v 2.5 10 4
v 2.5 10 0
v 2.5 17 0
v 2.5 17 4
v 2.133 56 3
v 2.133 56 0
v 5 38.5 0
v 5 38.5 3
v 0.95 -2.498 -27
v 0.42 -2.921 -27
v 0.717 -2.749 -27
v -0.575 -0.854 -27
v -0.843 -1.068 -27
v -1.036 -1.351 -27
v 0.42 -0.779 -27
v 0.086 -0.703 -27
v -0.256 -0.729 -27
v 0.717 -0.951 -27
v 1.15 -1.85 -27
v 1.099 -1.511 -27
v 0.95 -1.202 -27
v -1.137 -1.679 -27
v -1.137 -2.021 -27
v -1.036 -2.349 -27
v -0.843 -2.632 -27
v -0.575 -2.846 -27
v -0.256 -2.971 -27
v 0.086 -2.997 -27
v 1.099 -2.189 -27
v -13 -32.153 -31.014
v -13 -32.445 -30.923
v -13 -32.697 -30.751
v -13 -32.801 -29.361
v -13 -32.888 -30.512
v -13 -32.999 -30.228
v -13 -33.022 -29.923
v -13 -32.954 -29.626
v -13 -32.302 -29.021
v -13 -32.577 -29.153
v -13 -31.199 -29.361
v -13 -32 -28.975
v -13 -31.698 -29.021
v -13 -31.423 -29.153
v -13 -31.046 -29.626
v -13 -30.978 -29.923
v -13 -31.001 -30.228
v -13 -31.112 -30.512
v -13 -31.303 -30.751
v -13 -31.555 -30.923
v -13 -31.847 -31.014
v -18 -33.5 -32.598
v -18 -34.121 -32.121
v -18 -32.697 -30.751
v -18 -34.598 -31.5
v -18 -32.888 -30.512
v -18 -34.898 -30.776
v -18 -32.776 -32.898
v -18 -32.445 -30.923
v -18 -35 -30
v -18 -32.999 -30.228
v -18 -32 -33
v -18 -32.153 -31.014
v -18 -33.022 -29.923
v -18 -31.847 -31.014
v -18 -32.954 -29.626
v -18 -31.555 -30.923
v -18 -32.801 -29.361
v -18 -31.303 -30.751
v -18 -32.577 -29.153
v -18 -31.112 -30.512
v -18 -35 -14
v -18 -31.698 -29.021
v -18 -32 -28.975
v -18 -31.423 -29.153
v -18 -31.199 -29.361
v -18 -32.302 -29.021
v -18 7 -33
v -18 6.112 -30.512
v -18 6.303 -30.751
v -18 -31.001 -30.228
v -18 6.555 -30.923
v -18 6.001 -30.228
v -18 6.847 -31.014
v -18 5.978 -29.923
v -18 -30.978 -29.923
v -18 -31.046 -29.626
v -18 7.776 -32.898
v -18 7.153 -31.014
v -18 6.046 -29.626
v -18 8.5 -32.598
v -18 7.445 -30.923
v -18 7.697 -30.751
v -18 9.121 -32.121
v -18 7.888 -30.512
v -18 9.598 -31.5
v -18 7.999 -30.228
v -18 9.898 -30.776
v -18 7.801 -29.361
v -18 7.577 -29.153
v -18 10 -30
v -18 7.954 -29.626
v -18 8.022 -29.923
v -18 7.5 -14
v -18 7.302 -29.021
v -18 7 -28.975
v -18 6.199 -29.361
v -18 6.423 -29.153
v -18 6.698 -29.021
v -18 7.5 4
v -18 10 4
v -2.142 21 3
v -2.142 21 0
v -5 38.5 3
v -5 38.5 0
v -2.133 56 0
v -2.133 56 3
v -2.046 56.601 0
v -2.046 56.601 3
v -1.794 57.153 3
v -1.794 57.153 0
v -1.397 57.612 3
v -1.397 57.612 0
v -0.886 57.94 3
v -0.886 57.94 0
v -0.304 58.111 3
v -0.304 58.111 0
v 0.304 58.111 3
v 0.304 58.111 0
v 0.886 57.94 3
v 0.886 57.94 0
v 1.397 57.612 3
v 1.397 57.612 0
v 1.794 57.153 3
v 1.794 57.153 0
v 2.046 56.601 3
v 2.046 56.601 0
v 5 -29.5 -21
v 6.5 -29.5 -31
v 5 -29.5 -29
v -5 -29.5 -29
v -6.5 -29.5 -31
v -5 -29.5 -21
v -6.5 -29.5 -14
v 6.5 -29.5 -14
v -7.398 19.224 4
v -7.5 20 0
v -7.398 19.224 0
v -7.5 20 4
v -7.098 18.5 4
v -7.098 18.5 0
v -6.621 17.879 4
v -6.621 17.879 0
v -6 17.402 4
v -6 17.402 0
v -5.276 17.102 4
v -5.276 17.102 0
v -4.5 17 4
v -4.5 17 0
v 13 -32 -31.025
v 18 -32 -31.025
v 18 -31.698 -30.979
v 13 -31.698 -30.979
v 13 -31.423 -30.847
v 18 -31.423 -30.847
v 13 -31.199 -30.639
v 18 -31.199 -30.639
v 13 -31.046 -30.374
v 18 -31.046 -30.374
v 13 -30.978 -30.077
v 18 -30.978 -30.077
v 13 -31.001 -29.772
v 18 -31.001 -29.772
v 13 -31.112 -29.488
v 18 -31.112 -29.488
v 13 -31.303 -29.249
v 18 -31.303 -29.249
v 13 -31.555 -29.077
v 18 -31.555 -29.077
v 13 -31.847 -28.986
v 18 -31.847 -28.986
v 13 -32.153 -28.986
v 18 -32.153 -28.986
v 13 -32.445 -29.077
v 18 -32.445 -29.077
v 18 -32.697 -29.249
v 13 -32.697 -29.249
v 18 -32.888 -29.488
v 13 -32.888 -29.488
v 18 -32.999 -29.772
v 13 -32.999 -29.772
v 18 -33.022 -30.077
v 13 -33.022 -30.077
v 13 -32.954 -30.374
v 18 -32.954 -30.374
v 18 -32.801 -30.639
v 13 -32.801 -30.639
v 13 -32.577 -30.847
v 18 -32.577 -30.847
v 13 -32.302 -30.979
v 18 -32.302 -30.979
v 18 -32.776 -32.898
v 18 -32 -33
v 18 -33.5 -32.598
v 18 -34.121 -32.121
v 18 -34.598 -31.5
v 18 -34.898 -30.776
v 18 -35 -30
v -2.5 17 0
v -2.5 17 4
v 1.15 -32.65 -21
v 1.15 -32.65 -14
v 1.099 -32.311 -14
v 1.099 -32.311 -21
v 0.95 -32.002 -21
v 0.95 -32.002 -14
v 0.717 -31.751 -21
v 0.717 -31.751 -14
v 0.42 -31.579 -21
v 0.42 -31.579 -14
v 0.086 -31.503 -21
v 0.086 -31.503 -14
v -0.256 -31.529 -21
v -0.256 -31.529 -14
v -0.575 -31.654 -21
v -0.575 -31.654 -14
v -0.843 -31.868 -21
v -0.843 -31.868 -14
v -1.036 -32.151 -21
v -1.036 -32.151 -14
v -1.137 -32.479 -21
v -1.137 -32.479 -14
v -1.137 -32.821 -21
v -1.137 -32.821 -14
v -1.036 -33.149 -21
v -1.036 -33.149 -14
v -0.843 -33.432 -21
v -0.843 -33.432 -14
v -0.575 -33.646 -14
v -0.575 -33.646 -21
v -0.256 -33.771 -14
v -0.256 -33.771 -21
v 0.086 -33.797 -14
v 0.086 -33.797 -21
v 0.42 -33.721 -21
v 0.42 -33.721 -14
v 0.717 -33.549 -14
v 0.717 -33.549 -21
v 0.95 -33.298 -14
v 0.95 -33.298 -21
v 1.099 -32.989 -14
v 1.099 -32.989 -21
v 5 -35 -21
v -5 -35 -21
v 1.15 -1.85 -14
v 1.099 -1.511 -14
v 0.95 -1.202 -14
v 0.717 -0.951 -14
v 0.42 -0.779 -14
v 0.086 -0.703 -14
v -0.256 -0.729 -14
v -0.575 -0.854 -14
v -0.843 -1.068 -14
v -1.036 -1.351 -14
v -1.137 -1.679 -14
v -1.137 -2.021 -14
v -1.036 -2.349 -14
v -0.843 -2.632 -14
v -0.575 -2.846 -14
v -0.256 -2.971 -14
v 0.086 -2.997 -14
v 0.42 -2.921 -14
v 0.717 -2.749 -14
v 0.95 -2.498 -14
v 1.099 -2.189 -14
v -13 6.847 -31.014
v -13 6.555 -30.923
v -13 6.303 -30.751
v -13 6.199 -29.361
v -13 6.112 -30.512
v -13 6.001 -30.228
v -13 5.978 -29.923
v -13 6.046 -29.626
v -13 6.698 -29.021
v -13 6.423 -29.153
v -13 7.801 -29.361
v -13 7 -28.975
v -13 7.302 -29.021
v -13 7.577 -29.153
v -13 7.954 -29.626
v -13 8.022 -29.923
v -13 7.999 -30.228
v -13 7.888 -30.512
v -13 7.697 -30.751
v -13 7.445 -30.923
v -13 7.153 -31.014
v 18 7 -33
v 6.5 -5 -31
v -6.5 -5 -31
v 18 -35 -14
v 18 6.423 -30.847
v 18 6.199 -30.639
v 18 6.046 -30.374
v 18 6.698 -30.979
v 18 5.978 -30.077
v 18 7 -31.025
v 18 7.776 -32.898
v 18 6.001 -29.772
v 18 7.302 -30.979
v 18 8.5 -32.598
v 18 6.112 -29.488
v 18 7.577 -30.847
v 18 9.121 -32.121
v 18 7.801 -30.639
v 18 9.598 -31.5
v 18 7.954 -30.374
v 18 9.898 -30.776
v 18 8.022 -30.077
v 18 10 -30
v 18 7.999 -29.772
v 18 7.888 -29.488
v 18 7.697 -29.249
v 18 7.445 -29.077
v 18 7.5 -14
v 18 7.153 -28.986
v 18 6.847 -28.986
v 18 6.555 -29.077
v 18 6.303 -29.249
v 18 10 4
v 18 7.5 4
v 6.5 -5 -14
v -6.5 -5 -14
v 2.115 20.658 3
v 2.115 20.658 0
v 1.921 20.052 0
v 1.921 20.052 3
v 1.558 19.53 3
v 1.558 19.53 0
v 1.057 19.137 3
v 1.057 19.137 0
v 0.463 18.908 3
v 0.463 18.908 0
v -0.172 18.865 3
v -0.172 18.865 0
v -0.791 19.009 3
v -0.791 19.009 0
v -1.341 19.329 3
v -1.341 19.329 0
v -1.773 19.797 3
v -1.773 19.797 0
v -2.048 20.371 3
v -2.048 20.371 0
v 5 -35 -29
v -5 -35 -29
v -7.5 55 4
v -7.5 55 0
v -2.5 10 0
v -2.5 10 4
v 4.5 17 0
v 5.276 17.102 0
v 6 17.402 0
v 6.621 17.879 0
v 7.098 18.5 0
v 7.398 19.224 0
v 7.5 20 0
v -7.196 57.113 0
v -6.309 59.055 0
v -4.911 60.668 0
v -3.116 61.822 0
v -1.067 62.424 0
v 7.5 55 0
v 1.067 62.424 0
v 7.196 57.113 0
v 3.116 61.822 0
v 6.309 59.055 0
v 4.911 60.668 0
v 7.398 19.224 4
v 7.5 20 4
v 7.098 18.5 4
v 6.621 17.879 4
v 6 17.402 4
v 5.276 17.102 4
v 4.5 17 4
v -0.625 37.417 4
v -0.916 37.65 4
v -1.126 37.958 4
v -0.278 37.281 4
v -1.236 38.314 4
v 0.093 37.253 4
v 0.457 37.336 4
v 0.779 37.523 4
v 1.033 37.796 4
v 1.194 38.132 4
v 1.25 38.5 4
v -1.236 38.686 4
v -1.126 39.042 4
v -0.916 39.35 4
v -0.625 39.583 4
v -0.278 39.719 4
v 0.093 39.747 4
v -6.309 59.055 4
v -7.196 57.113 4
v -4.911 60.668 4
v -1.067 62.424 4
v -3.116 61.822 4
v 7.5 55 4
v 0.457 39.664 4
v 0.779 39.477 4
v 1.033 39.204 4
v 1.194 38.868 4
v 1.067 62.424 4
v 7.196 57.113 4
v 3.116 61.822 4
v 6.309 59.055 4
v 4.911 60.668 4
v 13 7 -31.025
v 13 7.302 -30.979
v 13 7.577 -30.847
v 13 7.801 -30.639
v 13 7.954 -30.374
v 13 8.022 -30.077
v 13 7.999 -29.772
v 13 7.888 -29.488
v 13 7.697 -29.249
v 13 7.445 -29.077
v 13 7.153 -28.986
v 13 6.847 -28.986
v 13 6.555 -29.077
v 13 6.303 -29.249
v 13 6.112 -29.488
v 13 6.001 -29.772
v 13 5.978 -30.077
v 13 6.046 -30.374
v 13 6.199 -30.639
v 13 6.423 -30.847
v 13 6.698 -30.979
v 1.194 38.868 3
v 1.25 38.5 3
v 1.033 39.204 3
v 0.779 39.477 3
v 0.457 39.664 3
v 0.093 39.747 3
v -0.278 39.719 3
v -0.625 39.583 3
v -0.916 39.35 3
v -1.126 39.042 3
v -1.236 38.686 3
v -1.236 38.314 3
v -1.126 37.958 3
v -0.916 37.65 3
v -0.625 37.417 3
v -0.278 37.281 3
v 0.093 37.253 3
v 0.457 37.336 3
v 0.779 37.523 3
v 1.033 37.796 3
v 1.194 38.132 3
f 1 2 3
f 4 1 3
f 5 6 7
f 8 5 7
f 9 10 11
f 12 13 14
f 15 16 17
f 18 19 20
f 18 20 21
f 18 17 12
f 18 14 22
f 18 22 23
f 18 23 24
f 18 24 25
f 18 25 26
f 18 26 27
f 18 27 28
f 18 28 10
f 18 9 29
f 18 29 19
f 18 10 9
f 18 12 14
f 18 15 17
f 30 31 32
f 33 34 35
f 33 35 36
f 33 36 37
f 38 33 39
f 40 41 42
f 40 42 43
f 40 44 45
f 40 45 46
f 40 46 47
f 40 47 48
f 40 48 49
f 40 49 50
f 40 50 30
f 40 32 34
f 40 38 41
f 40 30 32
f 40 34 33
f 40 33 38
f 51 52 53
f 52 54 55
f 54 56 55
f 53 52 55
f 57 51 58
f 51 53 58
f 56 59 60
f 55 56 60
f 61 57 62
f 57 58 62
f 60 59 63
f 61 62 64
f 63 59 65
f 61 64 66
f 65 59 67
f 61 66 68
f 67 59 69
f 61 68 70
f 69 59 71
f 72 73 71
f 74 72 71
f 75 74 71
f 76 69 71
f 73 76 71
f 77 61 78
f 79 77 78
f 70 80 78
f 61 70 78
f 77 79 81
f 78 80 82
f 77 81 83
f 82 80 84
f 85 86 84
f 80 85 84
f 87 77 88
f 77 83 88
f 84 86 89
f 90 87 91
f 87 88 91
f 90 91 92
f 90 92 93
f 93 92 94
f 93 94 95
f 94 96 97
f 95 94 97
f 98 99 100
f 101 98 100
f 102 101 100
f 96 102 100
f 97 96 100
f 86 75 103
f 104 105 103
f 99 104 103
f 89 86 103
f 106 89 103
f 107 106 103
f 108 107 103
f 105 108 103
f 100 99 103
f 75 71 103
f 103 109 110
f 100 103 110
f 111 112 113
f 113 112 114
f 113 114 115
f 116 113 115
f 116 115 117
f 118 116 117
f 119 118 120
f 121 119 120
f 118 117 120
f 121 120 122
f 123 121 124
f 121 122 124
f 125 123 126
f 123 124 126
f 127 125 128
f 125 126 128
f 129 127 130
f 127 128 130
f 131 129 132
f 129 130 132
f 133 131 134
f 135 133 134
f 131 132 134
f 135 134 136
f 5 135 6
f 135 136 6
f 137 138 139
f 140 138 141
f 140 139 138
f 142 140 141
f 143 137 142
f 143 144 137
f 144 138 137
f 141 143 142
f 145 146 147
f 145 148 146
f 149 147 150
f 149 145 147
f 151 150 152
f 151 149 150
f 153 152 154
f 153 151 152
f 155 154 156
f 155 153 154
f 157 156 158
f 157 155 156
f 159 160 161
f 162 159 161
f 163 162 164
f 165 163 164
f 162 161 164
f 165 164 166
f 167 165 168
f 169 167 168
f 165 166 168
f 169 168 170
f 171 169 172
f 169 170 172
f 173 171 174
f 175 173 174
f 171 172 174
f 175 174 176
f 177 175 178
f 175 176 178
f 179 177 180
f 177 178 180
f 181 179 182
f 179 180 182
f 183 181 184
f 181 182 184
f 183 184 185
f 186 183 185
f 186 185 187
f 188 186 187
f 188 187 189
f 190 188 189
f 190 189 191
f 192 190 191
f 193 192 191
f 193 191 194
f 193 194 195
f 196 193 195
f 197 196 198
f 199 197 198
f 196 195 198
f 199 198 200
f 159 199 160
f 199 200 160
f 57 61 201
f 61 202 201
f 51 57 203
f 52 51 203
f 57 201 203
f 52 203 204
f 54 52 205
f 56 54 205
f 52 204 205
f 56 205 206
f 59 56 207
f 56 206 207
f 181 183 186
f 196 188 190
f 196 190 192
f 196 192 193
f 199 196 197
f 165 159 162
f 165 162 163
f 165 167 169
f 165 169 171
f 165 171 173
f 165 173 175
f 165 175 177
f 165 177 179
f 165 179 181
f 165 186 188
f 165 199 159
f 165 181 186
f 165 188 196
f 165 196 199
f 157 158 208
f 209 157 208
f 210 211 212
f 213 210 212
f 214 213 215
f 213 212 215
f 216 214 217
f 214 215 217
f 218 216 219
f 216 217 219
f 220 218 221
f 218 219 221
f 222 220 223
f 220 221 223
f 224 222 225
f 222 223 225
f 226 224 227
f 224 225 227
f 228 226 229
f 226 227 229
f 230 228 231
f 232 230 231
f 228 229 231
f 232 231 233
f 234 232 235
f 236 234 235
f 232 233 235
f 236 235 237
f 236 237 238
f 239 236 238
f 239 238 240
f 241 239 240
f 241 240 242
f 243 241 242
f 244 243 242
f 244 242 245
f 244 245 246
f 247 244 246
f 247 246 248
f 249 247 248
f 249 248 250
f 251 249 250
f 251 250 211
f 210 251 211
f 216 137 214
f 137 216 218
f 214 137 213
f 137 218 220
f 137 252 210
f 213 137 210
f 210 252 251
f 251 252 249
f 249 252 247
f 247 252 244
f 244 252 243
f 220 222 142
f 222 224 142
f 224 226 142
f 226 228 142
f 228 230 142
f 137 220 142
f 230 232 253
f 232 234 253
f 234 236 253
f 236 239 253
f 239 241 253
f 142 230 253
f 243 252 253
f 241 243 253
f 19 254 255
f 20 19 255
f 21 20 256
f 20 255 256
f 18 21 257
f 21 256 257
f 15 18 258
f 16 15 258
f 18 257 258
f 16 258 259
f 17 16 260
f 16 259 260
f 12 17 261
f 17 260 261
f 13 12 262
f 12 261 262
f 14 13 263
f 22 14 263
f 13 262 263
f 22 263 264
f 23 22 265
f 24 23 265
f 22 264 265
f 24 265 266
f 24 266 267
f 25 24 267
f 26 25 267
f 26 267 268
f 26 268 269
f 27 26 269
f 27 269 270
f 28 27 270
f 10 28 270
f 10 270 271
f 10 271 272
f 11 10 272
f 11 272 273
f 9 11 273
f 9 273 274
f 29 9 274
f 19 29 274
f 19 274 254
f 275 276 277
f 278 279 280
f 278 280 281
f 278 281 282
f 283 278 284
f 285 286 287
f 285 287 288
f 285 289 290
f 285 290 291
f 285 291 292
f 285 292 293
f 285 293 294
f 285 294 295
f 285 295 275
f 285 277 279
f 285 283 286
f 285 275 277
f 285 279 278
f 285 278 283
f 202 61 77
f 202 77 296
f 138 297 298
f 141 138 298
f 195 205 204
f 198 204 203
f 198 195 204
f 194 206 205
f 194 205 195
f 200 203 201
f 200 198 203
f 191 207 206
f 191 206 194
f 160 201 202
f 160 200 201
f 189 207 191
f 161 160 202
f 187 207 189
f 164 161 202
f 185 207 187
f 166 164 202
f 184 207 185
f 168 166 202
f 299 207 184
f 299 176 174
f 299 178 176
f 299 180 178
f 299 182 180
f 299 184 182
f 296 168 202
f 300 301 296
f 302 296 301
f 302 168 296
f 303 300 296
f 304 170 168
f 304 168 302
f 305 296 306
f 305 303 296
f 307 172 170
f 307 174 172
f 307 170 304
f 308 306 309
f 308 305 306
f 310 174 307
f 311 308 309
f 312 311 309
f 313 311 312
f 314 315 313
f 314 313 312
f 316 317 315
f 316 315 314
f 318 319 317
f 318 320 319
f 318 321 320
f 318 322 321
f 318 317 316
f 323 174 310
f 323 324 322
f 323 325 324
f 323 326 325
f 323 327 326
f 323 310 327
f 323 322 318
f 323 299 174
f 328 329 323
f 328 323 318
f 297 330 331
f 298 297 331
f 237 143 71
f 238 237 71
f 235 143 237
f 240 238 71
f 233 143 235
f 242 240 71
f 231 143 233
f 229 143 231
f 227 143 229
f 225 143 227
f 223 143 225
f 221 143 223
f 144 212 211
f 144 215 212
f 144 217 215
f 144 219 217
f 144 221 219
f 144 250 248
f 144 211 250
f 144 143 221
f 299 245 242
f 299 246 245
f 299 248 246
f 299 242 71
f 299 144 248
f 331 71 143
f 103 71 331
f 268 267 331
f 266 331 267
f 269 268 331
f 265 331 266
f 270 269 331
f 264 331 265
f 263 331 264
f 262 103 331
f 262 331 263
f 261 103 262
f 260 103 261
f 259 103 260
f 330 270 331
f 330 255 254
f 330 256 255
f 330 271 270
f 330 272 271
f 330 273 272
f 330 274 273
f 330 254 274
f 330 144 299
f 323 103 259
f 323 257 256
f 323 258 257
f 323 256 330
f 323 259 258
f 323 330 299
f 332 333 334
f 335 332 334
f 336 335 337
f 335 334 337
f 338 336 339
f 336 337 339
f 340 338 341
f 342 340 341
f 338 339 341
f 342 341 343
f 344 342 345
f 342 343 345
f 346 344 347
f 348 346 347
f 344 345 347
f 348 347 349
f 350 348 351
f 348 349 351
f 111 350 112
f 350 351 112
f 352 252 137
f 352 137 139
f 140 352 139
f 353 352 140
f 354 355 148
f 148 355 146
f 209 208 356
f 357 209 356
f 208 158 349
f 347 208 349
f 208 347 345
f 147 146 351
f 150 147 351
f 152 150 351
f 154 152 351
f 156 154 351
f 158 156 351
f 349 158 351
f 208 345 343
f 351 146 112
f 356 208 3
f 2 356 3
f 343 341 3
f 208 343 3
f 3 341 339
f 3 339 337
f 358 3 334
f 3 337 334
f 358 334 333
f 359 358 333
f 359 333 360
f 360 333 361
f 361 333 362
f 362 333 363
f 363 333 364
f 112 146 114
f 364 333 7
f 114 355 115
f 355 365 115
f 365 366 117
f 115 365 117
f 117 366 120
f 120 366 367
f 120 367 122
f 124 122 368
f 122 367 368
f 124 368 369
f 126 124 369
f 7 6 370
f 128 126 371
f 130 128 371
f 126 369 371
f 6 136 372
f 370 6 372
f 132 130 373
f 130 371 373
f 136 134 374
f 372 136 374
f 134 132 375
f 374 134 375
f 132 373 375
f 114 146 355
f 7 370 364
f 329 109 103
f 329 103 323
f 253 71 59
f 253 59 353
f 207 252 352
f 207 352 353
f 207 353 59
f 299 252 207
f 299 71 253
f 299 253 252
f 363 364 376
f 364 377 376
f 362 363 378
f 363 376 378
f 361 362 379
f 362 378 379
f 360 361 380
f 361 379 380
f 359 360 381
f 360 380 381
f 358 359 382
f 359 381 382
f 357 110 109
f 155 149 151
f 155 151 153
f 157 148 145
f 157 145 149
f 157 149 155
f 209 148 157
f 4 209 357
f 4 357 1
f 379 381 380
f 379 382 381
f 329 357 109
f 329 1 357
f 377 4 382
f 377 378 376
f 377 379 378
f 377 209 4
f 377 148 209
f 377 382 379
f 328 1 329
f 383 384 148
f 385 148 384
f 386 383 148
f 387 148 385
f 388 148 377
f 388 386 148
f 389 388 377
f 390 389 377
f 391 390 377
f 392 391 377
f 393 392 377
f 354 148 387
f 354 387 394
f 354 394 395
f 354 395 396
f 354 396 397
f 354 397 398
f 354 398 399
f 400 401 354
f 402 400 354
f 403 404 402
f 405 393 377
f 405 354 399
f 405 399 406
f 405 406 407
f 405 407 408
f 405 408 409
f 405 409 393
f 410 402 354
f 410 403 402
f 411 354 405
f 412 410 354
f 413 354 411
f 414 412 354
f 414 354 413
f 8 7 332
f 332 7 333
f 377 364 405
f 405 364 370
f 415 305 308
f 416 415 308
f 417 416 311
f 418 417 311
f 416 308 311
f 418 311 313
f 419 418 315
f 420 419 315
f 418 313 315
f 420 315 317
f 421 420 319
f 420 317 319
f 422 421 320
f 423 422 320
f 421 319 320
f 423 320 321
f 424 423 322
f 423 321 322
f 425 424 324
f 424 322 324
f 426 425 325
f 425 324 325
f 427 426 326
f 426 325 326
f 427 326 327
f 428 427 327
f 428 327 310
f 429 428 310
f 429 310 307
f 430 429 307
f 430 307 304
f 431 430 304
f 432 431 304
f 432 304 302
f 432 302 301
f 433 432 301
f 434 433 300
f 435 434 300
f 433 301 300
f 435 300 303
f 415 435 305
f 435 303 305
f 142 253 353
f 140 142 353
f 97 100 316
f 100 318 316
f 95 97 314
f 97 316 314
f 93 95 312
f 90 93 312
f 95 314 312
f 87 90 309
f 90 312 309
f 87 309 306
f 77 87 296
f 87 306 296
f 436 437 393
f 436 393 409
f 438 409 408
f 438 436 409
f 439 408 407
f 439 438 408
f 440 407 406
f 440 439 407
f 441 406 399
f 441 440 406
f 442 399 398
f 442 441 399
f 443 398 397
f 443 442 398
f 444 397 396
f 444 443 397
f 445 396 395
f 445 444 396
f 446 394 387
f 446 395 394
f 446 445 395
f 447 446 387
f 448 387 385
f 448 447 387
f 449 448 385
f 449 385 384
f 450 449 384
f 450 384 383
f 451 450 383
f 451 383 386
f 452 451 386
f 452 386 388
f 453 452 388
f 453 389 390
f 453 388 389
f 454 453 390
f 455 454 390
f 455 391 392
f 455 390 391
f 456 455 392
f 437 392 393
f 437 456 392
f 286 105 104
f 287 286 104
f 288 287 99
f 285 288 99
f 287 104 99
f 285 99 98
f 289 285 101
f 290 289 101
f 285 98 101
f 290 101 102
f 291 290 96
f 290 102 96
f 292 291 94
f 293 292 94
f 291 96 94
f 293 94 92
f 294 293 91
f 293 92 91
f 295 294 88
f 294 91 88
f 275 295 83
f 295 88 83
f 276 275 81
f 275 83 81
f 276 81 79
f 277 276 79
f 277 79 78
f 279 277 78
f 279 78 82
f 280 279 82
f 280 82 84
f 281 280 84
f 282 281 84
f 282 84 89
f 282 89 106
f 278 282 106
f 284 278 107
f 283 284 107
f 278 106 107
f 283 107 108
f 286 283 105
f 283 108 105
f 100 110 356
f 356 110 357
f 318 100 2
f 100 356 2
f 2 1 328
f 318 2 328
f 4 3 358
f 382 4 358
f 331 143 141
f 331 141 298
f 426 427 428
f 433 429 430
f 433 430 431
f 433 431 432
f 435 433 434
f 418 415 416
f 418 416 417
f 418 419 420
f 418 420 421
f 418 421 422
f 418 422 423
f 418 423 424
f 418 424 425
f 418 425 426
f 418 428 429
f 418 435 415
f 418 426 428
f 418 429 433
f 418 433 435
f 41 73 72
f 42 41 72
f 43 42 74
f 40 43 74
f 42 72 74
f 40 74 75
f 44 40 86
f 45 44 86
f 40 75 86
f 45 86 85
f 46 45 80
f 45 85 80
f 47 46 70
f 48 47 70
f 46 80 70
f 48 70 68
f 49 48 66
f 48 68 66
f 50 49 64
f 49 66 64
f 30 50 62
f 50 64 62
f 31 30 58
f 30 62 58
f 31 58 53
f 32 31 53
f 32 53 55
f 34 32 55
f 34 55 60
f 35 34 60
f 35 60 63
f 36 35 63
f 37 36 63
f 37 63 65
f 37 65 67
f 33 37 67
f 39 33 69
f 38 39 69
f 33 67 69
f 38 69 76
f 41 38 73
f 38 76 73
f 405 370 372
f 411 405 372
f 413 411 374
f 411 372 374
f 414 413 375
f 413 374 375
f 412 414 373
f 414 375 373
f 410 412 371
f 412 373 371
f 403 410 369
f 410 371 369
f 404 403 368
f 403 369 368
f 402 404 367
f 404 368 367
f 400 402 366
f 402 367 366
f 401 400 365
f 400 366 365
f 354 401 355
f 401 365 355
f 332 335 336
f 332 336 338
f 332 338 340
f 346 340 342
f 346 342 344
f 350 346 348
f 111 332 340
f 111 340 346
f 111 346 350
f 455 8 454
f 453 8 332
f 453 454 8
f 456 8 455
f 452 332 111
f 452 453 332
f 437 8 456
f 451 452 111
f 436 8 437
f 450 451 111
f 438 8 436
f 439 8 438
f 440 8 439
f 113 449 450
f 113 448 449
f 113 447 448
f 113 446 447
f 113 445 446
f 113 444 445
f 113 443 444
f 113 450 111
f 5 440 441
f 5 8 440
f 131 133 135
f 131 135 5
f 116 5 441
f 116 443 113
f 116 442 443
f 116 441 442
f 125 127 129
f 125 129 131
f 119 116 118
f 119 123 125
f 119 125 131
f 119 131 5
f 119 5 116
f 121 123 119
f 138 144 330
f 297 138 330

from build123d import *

# Parameters (mm, degrees)
EXTRUDE_1_DEPTH     = 4
CUT_EXTRUDE_1_DEPTH = 3
SKETCH_5_R          = 1.25
CUT_EXTRUDE_2_DEPTH = 12.4
SKETCH_13_W         = 36
SKETCH_13_H         = 45
EXTRUDE_2_DEPTH     = 37
SKETCH_14_W         = 13
SKETCH_14_H         = 24.5
CUT_EXTRUDE_3_DEPTH = 35
SKETCH_15_R         = 1.15
CUT_EXTRUDE_4_DEPTH = 31
SKETCH_16_W         = 10
SKETCH_16_H         = 8
CUT_EXTRUDE_5_DEPTH = 8
SKETCH_17_W         = 36
SKETCH_17_H         = 42.5
CUT_EXTRUDE_6_DEPTH = 18
SKETCH_23_R         = 1.025
CUT_EXTRUDE_7_DEPTH = 5
SKETCH_24_R         = 1.025
CUT_EXTRUDE_8_DEPTH = 5
FILLET_1_R          = 3
FILLET_2_R          = 3
FILLET_3_R          = 3
FILLET_4_R          = 3


with BuildPart() as part:
    # 草圖1 → 填料-伸長1 (new body)
    with BuildSketch(Plane.XY):
        with BuildLine():
            Line((7.5, 17), (7.5, 55))
            ThreePointArc((7.5, 55), (0, 62.5), (-7.5, 55))
            Line((-7.5, 55), (-7.5, 17))
            Line((-7.5, 17), (-2.5, 17))
            Line((-2.5, 17), (-2.5, 15))
            Line((-2.5, 15), (-2.5, 10))
            Line((-2.5, 10), (2.5, 10))
            Line((2.5, 10), (2.5, 15))
            Line((2.5, 15), (2.5, 17))
            Line((2.5, 17), (7.5, 17))
        make_face()
    extrude(amount=EXTRUDE_1_DEPTH)

    # 草圖3 → 除料-伸長1 (cut)
    with BuildSketch(Plane.XY):
        with BuildLine():
            ThreePointArc((-2.132795501, 56), (0, 58.132795501), (2.132795501, 56))
            Line((2.132795501, 56), (5, 38.5))
            Line((5, 38.5), (2.114741289, 20.658021353))
            ThreePointArc((2.114741289, 20.658021353), (-0.171540182, 18.864665347), (-2.142213835, 21))
            Line((-2.142213835, 21), (-5, 38.5))
            Line((-5, 38.5), (-2.132795501, 56))
        make_face()
    extrude(amount=CUT_EXTRUDE_1_DEPTH, mode=Mode.SUBTRACT)

    # 草圖5 → 除料-伸長2 (cut)
    with BuildSketch(Plane.XY):
        with Locations((0, 38.5)):
            Circle(SKETCH_5_R)
    extrude(amount=CUT_EXTRUDE_2_DEPTH, mode=Mode.SUBTRACT)

    # 草圖13 → 填料-伸長2 (add)
    with BuildSketch(Plane.XY.offset(4)):
        with Locations((0, -12.5)):
            Rectangle(SKETCH_13_W, SKETCH_13_H)
    extrude(amount=-EXTRUDE_2_DEPTH)

    # 草圖14 → 除料-伸長3 (cut)
    with BuildSketch(Plane(origin=(0, 0, 4), x_dir=(-1, 0, 0), z_dir=(0, 0, -1))):
        with Locations((0, -17.25)):
            Rectangle(SKETCH_14_W, SKETCH_14_H)
    extrude(amount=CUT_EXTRUDE_3_DEPTH, mode=Mode.SUBTRACT)

    # 草圖15 → 除料-伸長4 (cut)
    with BuildSketch(Plane.XY.offset(4)):
        with Locations((0, -1.85)):
            Circle(SKETCH_15_R)
        with Locations((0, -32.65)):
            Circle(SKETCH_15_R)
    extrude(amount=-CUT_EXTRUDE_4_DEPTH, mode=Mode.SUBTRACT)

    # 草圖16 → 除料-伸長5 (cut)
    with BuildSketch(Plane(origin=(0, -35, 0), x_dir=(-1, 0, 0), z_dir=(0, -1, 0))):
        with Locations((0, 25)):
            Rectangle(SKETCH_16_W, SKETCH_16_H)
    extrude(amount=-CUT_EXTRUDE_5_DEPTH, mode=Mode.SUBTRACT)

    # 草圖17 → 除料-伸長6 (cut)
    with BuildSketch(Plane.XY.offset(4)):
        with Locations((0, -13.75)):
            Rectangle(SKETCH_17_W, SKETCH_17_H)
    extrude(amount=-CUT_EXTRUDE_6_DEPTH, mode=Mode.SUBTRACT)

    # 草圖23 → 除料-伸長7 (cut)
    with BuildSketch(Plane.ZY.offset(18)):
        with Locations((-30, 7)):
            Circle(SKETCH_23_R)
        with Locations((-30, -32)):
            Circle(SKETCH_23_R)
    extrude(amount=-CUT_EXTRUDE_7_DEPTH, mode=Mode.SUBTRACT)

    # 草圖24 → 除料-伸長8 (cut)
    with BuildSketch(Plane(origin=(18, 0, 0), x_dir=(0, 0, -1), z_dir=(1, 0, 0))):
        with Locations((30, 7)):
            Circle(SKETCH_24_R)
        with Locations((30, -32)):
            Circle(SKETCH_24_R)
    extrude(amount=-CUT_EXTRUDE_8_DEPTH, mode=Mode.SUBTRACT)

    # 圓角1
    fillet_1_edges = [part.edges().sort_by_distance(p)[0] for p in [
        (7.5, 17, 2),
    ]]
    fillet(fillet_1_edges, radius=FILLET_1_R)

    # 圓角2
    fillet_2_edges = [part.edges().sort_by_distance(p)[0] for p in [
        (-7.5, 17, 2),
    ]]
    fillet(fillet_2_edges, radius=FILLET_2_R)

    # 圓角3
    fillet_3_edges = [part.edges().sort_by_distance(p)[0] for p in [
        (0, 10, -33),
    ]]
    fillet(fillet_3_edges, radius=FILLET_3_R)

    # 圓角4
    fillet_4_edges = [part.edges().sort_by_distance(p)[0] for p in [
        (0, -35, -33),
    ]]
    fillet(fillet_4_edges, radius=FILLET_4_R)


solid = part.part
